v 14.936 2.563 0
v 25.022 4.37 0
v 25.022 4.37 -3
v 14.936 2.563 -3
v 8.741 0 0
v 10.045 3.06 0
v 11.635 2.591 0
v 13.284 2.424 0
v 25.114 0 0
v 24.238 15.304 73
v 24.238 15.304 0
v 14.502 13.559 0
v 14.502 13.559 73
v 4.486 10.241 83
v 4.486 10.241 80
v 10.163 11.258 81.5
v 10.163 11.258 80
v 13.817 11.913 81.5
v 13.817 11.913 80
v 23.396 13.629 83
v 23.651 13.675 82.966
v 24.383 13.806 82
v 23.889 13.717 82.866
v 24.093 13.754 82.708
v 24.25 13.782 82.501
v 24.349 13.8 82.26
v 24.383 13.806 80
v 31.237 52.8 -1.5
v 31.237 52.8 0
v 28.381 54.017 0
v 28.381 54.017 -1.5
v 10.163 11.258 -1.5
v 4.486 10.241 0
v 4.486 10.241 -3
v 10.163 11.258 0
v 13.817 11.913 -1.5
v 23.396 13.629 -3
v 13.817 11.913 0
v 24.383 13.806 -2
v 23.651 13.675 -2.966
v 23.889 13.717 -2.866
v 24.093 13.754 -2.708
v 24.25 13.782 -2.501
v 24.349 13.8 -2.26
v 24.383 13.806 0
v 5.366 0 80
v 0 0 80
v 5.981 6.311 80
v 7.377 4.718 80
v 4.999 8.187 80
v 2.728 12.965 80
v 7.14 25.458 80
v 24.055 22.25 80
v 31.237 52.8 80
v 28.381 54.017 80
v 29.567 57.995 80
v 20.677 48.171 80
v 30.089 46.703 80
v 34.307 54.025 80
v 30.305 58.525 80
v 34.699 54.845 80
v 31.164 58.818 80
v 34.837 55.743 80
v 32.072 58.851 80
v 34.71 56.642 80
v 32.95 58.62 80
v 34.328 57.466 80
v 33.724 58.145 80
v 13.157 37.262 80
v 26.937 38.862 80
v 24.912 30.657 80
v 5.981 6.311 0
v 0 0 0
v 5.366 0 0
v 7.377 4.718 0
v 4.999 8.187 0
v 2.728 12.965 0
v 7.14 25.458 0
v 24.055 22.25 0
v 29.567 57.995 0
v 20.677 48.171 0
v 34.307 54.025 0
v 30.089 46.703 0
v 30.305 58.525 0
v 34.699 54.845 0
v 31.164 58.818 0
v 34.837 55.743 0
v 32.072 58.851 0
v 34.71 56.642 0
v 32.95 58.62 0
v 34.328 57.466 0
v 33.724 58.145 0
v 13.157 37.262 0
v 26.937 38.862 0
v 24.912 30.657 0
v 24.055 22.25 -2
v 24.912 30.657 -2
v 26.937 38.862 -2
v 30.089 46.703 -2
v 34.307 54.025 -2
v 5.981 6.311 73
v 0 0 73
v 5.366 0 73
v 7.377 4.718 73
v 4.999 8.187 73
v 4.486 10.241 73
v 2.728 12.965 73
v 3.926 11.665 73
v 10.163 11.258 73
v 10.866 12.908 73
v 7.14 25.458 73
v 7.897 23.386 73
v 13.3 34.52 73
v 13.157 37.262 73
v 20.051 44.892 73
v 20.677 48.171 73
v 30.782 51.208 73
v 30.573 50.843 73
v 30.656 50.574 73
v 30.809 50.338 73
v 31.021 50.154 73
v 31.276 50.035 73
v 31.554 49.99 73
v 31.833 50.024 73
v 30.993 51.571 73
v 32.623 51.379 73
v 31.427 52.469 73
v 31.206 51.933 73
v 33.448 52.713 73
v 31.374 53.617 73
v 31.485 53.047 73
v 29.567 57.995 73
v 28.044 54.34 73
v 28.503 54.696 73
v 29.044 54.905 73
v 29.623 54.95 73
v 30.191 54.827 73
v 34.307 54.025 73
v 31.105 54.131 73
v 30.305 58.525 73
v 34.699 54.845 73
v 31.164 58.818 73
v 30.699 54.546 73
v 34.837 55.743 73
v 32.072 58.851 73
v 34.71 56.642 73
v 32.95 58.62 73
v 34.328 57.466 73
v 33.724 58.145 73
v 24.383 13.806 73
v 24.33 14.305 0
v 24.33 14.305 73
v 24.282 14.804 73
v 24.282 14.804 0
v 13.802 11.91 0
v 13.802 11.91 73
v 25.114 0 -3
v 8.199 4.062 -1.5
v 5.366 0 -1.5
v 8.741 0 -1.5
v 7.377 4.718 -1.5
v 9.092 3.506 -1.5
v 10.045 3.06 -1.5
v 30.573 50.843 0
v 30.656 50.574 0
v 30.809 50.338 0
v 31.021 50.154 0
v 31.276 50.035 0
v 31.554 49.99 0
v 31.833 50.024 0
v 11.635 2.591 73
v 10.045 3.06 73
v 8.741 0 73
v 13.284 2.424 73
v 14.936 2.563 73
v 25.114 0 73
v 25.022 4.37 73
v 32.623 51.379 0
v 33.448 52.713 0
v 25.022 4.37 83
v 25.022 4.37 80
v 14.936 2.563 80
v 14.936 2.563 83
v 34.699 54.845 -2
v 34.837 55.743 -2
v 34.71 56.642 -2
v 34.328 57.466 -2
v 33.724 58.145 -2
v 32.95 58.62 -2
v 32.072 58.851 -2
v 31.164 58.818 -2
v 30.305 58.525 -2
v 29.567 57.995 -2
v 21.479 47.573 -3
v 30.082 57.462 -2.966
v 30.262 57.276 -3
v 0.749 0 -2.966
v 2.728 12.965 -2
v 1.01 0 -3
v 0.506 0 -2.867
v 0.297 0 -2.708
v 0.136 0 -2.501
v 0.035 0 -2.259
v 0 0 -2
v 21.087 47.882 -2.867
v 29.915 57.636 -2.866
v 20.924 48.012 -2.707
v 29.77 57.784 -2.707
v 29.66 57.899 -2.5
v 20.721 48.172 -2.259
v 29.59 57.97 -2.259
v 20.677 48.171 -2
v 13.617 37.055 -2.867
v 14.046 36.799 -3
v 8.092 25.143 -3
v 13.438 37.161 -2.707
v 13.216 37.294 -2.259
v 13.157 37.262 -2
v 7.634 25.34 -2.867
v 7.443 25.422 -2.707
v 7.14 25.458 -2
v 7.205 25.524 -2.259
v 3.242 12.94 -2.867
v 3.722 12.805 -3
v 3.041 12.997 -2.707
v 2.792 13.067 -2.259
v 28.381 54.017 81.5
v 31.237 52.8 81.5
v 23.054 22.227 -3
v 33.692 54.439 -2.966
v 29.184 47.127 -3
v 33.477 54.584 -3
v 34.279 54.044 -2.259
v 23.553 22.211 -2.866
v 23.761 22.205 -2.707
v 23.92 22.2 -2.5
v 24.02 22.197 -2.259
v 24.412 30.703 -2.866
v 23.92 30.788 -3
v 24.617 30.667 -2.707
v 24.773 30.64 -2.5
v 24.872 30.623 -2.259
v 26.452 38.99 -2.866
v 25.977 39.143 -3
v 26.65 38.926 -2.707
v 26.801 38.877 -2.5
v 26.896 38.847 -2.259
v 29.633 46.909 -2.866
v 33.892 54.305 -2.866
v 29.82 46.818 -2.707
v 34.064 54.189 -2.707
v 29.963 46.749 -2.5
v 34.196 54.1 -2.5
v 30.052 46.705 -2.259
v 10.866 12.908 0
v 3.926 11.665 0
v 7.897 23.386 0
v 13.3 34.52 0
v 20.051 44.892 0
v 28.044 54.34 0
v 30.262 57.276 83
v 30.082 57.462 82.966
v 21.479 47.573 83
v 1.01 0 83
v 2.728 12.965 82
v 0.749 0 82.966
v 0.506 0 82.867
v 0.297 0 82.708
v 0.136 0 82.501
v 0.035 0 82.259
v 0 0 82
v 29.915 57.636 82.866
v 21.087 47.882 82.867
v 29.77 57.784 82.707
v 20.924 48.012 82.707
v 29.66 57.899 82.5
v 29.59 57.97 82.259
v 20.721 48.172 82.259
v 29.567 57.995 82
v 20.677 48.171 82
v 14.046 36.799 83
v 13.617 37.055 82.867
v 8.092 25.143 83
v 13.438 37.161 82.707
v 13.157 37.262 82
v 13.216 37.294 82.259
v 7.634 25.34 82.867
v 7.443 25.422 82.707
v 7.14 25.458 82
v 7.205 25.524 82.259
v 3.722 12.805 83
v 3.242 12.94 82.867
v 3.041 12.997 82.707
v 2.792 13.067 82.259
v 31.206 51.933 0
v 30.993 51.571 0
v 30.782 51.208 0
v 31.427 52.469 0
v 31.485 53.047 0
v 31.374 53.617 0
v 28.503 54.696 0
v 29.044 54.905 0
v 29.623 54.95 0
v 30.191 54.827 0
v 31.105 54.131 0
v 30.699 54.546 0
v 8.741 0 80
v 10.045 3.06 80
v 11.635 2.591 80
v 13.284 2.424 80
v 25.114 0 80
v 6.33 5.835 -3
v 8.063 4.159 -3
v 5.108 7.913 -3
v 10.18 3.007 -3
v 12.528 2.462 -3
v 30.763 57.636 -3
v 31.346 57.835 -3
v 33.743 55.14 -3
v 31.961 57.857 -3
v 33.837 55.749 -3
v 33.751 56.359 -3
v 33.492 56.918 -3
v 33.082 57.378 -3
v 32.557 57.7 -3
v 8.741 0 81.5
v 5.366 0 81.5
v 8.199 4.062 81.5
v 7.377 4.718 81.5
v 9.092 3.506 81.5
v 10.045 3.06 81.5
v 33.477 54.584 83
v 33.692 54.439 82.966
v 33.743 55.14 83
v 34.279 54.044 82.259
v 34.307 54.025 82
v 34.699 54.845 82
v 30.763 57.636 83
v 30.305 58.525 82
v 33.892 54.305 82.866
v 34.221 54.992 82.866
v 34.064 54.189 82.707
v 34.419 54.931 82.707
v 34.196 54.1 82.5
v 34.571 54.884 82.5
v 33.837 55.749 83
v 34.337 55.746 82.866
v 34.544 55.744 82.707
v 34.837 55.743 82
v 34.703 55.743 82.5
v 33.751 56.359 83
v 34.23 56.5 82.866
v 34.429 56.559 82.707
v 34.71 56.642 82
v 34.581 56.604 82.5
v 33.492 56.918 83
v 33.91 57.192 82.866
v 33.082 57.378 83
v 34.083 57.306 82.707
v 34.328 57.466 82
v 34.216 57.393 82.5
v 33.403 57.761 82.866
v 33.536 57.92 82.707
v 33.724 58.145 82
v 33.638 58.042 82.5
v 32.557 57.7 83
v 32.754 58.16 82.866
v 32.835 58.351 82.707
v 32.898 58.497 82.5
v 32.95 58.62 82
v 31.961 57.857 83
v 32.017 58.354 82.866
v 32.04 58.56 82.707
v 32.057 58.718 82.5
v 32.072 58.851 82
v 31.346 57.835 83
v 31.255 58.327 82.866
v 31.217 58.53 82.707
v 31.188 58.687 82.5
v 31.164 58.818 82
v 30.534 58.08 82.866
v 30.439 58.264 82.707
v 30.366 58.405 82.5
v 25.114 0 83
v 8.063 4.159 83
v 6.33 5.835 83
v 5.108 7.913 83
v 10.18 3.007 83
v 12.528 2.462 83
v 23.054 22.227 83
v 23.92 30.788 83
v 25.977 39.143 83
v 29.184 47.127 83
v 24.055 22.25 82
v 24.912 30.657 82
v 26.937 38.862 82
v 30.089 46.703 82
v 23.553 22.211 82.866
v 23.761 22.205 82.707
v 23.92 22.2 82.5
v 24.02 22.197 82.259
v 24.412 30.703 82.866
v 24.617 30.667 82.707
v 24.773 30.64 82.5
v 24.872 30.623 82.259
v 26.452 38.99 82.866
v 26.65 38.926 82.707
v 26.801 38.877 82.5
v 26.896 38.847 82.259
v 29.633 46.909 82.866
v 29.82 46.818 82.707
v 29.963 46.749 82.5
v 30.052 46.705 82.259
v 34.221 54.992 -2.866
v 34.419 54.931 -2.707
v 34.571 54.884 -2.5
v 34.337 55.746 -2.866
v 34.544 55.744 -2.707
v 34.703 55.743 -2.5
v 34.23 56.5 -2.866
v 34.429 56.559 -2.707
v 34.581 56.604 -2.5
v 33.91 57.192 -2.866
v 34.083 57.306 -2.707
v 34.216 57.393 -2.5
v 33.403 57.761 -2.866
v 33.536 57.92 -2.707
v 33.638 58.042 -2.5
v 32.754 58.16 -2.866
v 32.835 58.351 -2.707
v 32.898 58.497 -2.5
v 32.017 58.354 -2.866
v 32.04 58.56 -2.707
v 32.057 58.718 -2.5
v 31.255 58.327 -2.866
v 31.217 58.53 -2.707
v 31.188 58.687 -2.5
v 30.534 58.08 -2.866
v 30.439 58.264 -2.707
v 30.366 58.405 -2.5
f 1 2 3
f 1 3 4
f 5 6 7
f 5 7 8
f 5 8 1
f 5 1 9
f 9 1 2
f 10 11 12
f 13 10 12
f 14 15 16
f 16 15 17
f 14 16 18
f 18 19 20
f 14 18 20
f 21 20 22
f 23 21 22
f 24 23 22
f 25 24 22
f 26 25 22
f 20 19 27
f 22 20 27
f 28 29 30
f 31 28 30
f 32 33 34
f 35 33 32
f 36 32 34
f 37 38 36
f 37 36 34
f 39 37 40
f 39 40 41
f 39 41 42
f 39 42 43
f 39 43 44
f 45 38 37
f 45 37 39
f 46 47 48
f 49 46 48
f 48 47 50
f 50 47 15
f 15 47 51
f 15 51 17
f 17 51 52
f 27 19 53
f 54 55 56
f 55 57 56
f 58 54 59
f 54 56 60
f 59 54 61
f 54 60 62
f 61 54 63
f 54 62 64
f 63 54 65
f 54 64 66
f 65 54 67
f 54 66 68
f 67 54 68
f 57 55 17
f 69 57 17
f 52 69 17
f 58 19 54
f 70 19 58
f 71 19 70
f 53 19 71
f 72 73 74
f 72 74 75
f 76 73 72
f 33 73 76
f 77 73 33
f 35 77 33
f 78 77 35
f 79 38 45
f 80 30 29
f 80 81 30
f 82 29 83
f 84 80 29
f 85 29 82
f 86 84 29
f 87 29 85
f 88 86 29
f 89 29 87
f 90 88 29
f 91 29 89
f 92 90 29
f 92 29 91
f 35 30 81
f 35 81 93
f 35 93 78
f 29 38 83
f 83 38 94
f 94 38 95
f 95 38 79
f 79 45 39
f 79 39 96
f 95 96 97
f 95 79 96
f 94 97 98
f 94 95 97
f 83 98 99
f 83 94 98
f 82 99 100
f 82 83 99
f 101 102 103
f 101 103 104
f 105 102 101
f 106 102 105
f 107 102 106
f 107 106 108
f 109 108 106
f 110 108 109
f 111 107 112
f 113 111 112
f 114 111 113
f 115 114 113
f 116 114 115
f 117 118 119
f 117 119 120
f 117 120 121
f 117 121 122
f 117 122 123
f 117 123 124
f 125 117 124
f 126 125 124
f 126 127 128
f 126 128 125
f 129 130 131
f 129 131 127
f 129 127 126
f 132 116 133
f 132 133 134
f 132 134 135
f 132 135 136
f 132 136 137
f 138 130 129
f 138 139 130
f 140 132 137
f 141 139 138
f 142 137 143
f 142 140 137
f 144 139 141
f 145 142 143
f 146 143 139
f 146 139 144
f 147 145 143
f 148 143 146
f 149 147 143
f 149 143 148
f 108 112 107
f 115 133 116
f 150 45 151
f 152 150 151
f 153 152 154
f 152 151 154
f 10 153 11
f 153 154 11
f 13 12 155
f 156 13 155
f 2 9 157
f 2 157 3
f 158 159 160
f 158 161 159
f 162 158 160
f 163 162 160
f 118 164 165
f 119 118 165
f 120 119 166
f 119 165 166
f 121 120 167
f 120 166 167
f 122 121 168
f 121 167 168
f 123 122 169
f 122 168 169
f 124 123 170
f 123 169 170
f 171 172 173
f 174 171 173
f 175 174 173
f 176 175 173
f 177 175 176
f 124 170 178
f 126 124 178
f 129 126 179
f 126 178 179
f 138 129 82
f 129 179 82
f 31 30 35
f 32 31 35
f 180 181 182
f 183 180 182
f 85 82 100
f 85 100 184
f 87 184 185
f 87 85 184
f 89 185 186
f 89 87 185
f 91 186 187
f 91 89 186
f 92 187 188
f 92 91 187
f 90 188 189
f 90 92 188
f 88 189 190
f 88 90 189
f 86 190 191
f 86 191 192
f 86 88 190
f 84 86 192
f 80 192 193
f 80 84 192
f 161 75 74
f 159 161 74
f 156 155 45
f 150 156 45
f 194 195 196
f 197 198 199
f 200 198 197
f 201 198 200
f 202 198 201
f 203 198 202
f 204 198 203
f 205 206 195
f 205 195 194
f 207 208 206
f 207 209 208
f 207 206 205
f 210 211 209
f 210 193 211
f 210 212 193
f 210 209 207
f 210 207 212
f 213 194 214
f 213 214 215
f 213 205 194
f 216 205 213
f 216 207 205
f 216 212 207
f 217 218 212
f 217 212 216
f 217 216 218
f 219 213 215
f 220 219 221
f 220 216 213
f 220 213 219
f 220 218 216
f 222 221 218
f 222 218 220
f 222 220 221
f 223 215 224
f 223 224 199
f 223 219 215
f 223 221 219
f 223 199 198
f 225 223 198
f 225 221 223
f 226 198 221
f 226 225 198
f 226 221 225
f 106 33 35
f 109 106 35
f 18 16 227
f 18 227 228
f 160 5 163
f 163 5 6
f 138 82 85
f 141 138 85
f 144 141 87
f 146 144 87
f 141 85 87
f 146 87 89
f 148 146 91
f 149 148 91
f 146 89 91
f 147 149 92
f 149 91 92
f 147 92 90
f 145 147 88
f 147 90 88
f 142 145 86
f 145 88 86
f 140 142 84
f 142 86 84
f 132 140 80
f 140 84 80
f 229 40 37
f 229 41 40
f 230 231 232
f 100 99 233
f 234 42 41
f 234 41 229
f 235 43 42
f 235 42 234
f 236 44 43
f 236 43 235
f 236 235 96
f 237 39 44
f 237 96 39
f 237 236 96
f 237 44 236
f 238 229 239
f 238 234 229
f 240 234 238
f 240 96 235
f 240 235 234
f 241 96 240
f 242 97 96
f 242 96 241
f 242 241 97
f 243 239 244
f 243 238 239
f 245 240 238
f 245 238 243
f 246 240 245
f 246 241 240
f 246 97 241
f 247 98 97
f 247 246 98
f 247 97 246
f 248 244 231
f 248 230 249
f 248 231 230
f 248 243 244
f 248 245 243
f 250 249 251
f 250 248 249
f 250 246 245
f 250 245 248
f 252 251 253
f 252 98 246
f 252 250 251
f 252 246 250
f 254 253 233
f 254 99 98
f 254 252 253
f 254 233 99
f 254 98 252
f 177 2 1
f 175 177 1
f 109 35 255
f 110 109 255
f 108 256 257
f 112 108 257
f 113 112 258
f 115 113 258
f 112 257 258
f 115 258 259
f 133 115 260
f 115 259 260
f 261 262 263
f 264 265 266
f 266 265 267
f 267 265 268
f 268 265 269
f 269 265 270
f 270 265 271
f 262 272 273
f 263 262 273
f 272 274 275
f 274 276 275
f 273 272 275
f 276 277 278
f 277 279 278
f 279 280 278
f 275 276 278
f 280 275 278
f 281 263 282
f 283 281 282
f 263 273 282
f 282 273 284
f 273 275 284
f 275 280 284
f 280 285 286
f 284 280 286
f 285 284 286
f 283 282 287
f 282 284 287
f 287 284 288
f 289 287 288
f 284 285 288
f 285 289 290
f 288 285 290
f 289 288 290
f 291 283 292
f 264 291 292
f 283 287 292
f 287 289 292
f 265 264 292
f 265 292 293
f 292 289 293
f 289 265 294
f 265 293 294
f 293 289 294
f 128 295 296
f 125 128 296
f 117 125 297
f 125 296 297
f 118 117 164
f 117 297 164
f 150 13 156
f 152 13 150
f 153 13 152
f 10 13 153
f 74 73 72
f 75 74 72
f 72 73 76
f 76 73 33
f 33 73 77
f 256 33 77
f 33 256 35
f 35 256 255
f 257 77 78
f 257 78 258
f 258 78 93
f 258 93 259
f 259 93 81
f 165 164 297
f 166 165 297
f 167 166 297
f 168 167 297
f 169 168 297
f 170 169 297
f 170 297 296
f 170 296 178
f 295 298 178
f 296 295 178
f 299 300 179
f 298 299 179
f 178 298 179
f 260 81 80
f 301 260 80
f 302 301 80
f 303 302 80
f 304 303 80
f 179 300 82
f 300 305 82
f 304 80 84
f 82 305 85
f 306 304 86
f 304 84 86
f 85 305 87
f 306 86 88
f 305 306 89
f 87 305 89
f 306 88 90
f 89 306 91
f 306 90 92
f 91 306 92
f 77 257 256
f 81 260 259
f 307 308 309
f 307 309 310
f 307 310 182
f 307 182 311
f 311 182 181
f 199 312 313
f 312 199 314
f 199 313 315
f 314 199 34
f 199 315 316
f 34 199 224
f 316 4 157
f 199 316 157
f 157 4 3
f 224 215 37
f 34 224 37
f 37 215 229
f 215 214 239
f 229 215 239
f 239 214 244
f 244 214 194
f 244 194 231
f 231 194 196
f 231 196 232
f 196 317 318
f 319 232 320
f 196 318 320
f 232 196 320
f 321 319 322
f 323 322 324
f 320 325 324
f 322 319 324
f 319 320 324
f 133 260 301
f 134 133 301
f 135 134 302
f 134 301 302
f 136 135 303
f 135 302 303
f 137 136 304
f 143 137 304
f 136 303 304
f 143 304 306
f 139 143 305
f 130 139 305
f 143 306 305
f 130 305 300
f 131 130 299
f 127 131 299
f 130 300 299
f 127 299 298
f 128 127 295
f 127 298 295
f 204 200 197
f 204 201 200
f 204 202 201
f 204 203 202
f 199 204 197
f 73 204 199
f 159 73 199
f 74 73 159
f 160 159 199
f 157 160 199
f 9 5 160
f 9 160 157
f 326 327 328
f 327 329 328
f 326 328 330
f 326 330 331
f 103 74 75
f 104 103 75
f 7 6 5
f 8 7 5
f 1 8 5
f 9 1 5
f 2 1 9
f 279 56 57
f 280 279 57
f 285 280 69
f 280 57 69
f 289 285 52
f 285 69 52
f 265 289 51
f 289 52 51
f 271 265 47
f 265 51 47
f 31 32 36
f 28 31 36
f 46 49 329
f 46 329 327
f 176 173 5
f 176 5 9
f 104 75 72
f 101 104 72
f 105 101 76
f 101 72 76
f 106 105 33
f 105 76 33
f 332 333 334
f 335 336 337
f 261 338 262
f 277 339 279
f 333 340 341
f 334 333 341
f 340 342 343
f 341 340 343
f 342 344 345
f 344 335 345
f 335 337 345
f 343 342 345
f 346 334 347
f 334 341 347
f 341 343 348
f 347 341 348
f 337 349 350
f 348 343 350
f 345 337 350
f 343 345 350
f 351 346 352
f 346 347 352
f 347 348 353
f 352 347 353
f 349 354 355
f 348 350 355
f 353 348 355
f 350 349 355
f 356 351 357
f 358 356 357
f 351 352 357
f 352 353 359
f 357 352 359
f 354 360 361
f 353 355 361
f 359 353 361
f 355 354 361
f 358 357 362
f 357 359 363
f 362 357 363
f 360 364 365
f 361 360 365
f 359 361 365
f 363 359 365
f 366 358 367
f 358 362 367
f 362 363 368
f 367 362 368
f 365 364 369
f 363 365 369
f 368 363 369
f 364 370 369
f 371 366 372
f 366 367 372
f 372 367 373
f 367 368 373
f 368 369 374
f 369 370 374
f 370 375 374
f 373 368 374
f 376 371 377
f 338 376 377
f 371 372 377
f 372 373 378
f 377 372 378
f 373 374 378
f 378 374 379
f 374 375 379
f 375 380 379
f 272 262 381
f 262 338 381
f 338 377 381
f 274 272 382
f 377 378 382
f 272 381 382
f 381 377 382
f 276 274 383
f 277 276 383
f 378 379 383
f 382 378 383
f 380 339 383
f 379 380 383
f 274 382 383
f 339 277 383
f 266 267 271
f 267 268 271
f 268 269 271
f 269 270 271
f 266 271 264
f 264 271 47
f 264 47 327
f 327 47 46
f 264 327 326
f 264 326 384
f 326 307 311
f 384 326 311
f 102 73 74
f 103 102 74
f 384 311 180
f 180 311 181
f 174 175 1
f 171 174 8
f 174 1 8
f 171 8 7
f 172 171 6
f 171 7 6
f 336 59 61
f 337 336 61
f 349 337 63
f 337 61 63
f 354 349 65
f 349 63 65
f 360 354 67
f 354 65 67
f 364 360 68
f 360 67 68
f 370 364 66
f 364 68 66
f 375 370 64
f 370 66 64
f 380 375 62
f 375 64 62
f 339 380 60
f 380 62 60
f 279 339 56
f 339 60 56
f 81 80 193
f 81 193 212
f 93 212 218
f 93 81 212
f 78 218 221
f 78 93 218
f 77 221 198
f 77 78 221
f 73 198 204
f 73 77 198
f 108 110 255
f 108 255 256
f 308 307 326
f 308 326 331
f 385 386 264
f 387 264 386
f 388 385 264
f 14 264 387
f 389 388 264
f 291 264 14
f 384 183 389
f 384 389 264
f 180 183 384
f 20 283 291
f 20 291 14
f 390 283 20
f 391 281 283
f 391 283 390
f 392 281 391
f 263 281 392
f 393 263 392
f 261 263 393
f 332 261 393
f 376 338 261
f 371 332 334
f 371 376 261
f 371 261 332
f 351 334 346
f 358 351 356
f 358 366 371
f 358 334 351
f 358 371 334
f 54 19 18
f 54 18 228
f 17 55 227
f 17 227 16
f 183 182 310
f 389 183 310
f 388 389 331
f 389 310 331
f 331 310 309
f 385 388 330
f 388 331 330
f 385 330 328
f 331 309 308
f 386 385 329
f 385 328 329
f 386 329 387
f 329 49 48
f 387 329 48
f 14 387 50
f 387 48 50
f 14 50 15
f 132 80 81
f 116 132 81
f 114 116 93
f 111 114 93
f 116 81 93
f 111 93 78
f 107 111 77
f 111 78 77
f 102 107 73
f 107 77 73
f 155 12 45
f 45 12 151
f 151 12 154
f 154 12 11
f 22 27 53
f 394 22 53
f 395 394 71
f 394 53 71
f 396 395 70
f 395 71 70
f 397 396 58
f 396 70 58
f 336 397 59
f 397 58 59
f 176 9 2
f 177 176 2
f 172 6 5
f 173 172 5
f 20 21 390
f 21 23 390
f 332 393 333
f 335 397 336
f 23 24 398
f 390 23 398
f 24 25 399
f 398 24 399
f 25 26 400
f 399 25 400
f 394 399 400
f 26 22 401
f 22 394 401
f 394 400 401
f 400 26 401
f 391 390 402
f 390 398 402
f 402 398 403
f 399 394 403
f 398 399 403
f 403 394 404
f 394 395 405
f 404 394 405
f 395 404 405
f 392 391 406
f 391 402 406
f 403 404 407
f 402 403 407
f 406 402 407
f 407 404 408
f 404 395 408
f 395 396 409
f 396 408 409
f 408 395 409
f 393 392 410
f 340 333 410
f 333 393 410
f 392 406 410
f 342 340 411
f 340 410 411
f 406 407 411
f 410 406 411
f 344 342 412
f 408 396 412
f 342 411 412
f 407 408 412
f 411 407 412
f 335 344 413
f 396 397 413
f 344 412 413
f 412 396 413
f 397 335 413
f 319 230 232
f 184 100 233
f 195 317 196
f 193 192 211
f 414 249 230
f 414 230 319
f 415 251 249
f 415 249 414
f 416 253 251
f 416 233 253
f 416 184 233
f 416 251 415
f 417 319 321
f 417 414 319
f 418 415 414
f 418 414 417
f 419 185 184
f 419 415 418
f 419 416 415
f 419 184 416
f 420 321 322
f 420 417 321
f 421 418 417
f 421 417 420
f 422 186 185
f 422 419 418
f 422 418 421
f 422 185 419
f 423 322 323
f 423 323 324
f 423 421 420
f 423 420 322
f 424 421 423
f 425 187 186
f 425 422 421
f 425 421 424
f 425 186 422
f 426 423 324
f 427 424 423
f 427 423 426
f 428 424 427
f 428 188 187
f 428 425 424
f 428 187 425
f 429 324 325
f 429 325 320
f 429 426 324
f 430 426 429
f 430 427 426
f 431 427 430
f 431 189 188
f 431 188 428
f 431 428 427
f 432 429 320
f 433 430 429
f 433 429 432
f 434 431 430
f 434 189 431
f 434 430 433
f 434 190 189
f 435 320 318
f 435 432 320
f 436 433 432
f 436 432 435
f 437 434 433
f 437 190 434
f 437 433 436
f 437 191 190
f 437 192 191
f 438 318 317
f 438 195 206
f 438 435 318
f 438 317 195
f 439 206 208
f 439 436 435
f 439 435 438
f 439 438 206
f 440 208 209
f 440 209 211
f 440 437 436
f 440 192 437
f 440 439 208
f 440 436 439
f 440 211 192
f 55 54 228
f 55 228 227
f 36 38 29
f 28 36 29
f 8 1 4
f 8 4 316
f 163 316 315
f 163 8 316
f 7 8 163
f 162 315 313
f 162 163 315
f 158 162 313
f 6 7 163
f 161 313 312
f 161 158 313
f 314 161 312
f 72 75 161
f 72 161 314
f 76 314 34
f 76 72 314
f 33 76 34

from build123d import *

# Parameters (mm, degrees)
F1_DEPTH = 3
F3_DEPTH = 1.5
F6_DEPTH = 73
F8_R     = 1
F9_R     = 1


with BuildPart() as f1:
    # F0 (on Top) → F1 (new body)
    with BuildSketch(Plane.XY):
        with BuildLine():
            Line((0, 0), (25.1138086896, 0))
            Line((25.1138086896, 0), (25.0219496666, 4.3704304844))
            Line((25.0219496666, 4.3704304844), (14.93563812, 2.56344391))
            ThreePointArc((14.93563812, 2.56344391), (8.0628712758, 4.159438542), (4.4855117871, 10.2409368811))
            Line((4.4855117871, 10.2409368811), (24.3829425915, 13.8056086803))
            ThreePointArc((24.3829425915, 13.8056086803), (25.7805627183, 34.7949655604), (34.3067951238, 54.0254051089))
            ThreePointArc((34.3067951238, 54.0254051089), (33.7243946279, 58.1447969682), (29.5667392269, 57.9948596671))
            ThreePointArc((29.5667392269, 57.9948596671), (9.9536753745, 31.4596878841), (0, 0))
        make_face()
    extrude(amount=-F1_DEPTH)

    # F2 (on face) → F3 (cut)
    with BuildSketch(Plane.XY):
        with BuildLine():
            Line((5.3663372301, 0), (8.7410803077, 0))
            Line((8.7410803077, 0), (10.0447398808, 3.0597517212))
            ThreePointArc((10.0447398808, 3.0597517212), (8.63725595, 3.7708123332), (7.3765235564, 4.7180039933))
            Line((7.3765235564, 4.7180039933), (5.3663372301, 0))
        make_face()
        Polygon((31.237378109, 52.7998929604), (28.3811374817, 54.01684315), (10.1630341787, 11.2580784486), (13.8166620739, 11.9126345293), align=None)
    extrude(amount=-F3_DEPTH, mode=Mode.SUBTRACT)


with BuildPart() as f6:
    # F5 (on face) → F6 (new body)
    with BuildSketch(Plane.XY):
        with BuildLine():
            ThreePointArc((31.8331169384, 50.0241250258), (33.0309009779, 52.0489097488), (34.3067951238, 54.0254051089))
            ThreePointArc((34.3067951238, 54.0254051089), (33.7243946279, 58.1447969682), (29.5667392269, 57.9948596671))
            ThreePointArc((29.5667392269, 57.9948596671), (9.9536753745, 31.4596878841), (0, 0))
            Line((0, 0), (5.3663372301, 0))
            Line((5.3663372301, 0), (7.3765235564, 4.7180039933))
            ThreePointArc((7.3765235564, 4.7180039933), (5.4342778468, 7.2194490483), (4.4855117871, 10.2409368811))
            Line((4.4855117871, 10.2409368811), (10.1630341787, 11.2580784486))
            Line((10.1630341787, 11.2580784486), (10.8659653877, 12.9078918055))
            Line((10.8659653877, 12.9078918055), (3.9259152051, 11.6645653974))
            ThreePointArc((3.9259152051, 11.6645653974), (13.2997819097, 34.5197789471), (28.044183302, 54.3397888104))
            ThreePointArc((28.044183302, 54.3397888104), (30.6987006163, 54.5463724131), (31.2061778728, 51.9326383426))
            ThreePointArc((31.2061778728, 51.9326383426), (30.8868062462, 51.3893939045), (30.5729935197, 50.8429194512))
            ThreePointArc((30.5729935197, 50.8429194512), (31.0211563475, 50.1535801269), (31.8331169384, 50.0241250258))
        make_face()
    extrude(amount=F6_DEPTH)


with BuildPart() as f6b:
    # F5 (on face) → F6, piece 2 (new body)
    with BuildSketch(Plane.XY):
        with BuildLine():
            Line((8.7410803077, 0), (25.1138086896, 0))
            Line((25.1138086896, 0), (25.0219496666, 4.3704304844))
            Line((25.0219496666, 4.3704304844), (14.93563812, 2.56344391))
            ThreePointArc((14.93563812, 2.56344391), (12.4554209462, 2.4689737195), (10.0447398808, 3.0597517212))
            Line((10.0447398808, 3.0597517212), (8.7410803077, 0))
        make_face()
    extrude(amount=F6_DEPTH)


with BuildPart() as f6c:
    # F5 (on face) → F6, piece 3 (new body)
    with BuildSketch(Plane.XY):
        with BuildLine():
            Line((13.8020408929, 11.9100151102), (24.3829425915, 13.8056086803))
            ThreePointArc((24.3829425915, 13.8056086803), (24.3058086676, 14.5541160496), (24.2380261197, 15.3035281194))
            Line((24.2380261197, 15.3035281194), (14.5022473149, 13.5593403149))
            Line((14.5022473149, 13.5593403149), (13.8020408929, 11.9100151102))
        make_face()
    extrude(amount=F6_DEPTH)


with BuildPart() as f7_1:
    # F7: instance of F1
    add(f1.part.mirror(Plane.XY.offset(40)))

    # F9
    f9_edges = [f7_1.edges().sort_by_distance(p)[0] for p in [
        (9.953675, 31.459688, 83),
        (25.780563, 34.794966, 83),
        (33.724395, 58.144797, 83),
    ]]
    fillet(f9_edges, radius=F9_R)


with BuildPart() as f1_1:
    add(f1.part)

    # F8
    f8_edges = [f1_1.edges().sort_by_distance(p)[0] for p in [
        (9.953675, 31.459688, -3),
    ]]
    fillet(f8_edges, radius=F8_R)


solid = Compound([f6.part, f6b.part, f6c.part, f7_1.part, f1_1.part])
